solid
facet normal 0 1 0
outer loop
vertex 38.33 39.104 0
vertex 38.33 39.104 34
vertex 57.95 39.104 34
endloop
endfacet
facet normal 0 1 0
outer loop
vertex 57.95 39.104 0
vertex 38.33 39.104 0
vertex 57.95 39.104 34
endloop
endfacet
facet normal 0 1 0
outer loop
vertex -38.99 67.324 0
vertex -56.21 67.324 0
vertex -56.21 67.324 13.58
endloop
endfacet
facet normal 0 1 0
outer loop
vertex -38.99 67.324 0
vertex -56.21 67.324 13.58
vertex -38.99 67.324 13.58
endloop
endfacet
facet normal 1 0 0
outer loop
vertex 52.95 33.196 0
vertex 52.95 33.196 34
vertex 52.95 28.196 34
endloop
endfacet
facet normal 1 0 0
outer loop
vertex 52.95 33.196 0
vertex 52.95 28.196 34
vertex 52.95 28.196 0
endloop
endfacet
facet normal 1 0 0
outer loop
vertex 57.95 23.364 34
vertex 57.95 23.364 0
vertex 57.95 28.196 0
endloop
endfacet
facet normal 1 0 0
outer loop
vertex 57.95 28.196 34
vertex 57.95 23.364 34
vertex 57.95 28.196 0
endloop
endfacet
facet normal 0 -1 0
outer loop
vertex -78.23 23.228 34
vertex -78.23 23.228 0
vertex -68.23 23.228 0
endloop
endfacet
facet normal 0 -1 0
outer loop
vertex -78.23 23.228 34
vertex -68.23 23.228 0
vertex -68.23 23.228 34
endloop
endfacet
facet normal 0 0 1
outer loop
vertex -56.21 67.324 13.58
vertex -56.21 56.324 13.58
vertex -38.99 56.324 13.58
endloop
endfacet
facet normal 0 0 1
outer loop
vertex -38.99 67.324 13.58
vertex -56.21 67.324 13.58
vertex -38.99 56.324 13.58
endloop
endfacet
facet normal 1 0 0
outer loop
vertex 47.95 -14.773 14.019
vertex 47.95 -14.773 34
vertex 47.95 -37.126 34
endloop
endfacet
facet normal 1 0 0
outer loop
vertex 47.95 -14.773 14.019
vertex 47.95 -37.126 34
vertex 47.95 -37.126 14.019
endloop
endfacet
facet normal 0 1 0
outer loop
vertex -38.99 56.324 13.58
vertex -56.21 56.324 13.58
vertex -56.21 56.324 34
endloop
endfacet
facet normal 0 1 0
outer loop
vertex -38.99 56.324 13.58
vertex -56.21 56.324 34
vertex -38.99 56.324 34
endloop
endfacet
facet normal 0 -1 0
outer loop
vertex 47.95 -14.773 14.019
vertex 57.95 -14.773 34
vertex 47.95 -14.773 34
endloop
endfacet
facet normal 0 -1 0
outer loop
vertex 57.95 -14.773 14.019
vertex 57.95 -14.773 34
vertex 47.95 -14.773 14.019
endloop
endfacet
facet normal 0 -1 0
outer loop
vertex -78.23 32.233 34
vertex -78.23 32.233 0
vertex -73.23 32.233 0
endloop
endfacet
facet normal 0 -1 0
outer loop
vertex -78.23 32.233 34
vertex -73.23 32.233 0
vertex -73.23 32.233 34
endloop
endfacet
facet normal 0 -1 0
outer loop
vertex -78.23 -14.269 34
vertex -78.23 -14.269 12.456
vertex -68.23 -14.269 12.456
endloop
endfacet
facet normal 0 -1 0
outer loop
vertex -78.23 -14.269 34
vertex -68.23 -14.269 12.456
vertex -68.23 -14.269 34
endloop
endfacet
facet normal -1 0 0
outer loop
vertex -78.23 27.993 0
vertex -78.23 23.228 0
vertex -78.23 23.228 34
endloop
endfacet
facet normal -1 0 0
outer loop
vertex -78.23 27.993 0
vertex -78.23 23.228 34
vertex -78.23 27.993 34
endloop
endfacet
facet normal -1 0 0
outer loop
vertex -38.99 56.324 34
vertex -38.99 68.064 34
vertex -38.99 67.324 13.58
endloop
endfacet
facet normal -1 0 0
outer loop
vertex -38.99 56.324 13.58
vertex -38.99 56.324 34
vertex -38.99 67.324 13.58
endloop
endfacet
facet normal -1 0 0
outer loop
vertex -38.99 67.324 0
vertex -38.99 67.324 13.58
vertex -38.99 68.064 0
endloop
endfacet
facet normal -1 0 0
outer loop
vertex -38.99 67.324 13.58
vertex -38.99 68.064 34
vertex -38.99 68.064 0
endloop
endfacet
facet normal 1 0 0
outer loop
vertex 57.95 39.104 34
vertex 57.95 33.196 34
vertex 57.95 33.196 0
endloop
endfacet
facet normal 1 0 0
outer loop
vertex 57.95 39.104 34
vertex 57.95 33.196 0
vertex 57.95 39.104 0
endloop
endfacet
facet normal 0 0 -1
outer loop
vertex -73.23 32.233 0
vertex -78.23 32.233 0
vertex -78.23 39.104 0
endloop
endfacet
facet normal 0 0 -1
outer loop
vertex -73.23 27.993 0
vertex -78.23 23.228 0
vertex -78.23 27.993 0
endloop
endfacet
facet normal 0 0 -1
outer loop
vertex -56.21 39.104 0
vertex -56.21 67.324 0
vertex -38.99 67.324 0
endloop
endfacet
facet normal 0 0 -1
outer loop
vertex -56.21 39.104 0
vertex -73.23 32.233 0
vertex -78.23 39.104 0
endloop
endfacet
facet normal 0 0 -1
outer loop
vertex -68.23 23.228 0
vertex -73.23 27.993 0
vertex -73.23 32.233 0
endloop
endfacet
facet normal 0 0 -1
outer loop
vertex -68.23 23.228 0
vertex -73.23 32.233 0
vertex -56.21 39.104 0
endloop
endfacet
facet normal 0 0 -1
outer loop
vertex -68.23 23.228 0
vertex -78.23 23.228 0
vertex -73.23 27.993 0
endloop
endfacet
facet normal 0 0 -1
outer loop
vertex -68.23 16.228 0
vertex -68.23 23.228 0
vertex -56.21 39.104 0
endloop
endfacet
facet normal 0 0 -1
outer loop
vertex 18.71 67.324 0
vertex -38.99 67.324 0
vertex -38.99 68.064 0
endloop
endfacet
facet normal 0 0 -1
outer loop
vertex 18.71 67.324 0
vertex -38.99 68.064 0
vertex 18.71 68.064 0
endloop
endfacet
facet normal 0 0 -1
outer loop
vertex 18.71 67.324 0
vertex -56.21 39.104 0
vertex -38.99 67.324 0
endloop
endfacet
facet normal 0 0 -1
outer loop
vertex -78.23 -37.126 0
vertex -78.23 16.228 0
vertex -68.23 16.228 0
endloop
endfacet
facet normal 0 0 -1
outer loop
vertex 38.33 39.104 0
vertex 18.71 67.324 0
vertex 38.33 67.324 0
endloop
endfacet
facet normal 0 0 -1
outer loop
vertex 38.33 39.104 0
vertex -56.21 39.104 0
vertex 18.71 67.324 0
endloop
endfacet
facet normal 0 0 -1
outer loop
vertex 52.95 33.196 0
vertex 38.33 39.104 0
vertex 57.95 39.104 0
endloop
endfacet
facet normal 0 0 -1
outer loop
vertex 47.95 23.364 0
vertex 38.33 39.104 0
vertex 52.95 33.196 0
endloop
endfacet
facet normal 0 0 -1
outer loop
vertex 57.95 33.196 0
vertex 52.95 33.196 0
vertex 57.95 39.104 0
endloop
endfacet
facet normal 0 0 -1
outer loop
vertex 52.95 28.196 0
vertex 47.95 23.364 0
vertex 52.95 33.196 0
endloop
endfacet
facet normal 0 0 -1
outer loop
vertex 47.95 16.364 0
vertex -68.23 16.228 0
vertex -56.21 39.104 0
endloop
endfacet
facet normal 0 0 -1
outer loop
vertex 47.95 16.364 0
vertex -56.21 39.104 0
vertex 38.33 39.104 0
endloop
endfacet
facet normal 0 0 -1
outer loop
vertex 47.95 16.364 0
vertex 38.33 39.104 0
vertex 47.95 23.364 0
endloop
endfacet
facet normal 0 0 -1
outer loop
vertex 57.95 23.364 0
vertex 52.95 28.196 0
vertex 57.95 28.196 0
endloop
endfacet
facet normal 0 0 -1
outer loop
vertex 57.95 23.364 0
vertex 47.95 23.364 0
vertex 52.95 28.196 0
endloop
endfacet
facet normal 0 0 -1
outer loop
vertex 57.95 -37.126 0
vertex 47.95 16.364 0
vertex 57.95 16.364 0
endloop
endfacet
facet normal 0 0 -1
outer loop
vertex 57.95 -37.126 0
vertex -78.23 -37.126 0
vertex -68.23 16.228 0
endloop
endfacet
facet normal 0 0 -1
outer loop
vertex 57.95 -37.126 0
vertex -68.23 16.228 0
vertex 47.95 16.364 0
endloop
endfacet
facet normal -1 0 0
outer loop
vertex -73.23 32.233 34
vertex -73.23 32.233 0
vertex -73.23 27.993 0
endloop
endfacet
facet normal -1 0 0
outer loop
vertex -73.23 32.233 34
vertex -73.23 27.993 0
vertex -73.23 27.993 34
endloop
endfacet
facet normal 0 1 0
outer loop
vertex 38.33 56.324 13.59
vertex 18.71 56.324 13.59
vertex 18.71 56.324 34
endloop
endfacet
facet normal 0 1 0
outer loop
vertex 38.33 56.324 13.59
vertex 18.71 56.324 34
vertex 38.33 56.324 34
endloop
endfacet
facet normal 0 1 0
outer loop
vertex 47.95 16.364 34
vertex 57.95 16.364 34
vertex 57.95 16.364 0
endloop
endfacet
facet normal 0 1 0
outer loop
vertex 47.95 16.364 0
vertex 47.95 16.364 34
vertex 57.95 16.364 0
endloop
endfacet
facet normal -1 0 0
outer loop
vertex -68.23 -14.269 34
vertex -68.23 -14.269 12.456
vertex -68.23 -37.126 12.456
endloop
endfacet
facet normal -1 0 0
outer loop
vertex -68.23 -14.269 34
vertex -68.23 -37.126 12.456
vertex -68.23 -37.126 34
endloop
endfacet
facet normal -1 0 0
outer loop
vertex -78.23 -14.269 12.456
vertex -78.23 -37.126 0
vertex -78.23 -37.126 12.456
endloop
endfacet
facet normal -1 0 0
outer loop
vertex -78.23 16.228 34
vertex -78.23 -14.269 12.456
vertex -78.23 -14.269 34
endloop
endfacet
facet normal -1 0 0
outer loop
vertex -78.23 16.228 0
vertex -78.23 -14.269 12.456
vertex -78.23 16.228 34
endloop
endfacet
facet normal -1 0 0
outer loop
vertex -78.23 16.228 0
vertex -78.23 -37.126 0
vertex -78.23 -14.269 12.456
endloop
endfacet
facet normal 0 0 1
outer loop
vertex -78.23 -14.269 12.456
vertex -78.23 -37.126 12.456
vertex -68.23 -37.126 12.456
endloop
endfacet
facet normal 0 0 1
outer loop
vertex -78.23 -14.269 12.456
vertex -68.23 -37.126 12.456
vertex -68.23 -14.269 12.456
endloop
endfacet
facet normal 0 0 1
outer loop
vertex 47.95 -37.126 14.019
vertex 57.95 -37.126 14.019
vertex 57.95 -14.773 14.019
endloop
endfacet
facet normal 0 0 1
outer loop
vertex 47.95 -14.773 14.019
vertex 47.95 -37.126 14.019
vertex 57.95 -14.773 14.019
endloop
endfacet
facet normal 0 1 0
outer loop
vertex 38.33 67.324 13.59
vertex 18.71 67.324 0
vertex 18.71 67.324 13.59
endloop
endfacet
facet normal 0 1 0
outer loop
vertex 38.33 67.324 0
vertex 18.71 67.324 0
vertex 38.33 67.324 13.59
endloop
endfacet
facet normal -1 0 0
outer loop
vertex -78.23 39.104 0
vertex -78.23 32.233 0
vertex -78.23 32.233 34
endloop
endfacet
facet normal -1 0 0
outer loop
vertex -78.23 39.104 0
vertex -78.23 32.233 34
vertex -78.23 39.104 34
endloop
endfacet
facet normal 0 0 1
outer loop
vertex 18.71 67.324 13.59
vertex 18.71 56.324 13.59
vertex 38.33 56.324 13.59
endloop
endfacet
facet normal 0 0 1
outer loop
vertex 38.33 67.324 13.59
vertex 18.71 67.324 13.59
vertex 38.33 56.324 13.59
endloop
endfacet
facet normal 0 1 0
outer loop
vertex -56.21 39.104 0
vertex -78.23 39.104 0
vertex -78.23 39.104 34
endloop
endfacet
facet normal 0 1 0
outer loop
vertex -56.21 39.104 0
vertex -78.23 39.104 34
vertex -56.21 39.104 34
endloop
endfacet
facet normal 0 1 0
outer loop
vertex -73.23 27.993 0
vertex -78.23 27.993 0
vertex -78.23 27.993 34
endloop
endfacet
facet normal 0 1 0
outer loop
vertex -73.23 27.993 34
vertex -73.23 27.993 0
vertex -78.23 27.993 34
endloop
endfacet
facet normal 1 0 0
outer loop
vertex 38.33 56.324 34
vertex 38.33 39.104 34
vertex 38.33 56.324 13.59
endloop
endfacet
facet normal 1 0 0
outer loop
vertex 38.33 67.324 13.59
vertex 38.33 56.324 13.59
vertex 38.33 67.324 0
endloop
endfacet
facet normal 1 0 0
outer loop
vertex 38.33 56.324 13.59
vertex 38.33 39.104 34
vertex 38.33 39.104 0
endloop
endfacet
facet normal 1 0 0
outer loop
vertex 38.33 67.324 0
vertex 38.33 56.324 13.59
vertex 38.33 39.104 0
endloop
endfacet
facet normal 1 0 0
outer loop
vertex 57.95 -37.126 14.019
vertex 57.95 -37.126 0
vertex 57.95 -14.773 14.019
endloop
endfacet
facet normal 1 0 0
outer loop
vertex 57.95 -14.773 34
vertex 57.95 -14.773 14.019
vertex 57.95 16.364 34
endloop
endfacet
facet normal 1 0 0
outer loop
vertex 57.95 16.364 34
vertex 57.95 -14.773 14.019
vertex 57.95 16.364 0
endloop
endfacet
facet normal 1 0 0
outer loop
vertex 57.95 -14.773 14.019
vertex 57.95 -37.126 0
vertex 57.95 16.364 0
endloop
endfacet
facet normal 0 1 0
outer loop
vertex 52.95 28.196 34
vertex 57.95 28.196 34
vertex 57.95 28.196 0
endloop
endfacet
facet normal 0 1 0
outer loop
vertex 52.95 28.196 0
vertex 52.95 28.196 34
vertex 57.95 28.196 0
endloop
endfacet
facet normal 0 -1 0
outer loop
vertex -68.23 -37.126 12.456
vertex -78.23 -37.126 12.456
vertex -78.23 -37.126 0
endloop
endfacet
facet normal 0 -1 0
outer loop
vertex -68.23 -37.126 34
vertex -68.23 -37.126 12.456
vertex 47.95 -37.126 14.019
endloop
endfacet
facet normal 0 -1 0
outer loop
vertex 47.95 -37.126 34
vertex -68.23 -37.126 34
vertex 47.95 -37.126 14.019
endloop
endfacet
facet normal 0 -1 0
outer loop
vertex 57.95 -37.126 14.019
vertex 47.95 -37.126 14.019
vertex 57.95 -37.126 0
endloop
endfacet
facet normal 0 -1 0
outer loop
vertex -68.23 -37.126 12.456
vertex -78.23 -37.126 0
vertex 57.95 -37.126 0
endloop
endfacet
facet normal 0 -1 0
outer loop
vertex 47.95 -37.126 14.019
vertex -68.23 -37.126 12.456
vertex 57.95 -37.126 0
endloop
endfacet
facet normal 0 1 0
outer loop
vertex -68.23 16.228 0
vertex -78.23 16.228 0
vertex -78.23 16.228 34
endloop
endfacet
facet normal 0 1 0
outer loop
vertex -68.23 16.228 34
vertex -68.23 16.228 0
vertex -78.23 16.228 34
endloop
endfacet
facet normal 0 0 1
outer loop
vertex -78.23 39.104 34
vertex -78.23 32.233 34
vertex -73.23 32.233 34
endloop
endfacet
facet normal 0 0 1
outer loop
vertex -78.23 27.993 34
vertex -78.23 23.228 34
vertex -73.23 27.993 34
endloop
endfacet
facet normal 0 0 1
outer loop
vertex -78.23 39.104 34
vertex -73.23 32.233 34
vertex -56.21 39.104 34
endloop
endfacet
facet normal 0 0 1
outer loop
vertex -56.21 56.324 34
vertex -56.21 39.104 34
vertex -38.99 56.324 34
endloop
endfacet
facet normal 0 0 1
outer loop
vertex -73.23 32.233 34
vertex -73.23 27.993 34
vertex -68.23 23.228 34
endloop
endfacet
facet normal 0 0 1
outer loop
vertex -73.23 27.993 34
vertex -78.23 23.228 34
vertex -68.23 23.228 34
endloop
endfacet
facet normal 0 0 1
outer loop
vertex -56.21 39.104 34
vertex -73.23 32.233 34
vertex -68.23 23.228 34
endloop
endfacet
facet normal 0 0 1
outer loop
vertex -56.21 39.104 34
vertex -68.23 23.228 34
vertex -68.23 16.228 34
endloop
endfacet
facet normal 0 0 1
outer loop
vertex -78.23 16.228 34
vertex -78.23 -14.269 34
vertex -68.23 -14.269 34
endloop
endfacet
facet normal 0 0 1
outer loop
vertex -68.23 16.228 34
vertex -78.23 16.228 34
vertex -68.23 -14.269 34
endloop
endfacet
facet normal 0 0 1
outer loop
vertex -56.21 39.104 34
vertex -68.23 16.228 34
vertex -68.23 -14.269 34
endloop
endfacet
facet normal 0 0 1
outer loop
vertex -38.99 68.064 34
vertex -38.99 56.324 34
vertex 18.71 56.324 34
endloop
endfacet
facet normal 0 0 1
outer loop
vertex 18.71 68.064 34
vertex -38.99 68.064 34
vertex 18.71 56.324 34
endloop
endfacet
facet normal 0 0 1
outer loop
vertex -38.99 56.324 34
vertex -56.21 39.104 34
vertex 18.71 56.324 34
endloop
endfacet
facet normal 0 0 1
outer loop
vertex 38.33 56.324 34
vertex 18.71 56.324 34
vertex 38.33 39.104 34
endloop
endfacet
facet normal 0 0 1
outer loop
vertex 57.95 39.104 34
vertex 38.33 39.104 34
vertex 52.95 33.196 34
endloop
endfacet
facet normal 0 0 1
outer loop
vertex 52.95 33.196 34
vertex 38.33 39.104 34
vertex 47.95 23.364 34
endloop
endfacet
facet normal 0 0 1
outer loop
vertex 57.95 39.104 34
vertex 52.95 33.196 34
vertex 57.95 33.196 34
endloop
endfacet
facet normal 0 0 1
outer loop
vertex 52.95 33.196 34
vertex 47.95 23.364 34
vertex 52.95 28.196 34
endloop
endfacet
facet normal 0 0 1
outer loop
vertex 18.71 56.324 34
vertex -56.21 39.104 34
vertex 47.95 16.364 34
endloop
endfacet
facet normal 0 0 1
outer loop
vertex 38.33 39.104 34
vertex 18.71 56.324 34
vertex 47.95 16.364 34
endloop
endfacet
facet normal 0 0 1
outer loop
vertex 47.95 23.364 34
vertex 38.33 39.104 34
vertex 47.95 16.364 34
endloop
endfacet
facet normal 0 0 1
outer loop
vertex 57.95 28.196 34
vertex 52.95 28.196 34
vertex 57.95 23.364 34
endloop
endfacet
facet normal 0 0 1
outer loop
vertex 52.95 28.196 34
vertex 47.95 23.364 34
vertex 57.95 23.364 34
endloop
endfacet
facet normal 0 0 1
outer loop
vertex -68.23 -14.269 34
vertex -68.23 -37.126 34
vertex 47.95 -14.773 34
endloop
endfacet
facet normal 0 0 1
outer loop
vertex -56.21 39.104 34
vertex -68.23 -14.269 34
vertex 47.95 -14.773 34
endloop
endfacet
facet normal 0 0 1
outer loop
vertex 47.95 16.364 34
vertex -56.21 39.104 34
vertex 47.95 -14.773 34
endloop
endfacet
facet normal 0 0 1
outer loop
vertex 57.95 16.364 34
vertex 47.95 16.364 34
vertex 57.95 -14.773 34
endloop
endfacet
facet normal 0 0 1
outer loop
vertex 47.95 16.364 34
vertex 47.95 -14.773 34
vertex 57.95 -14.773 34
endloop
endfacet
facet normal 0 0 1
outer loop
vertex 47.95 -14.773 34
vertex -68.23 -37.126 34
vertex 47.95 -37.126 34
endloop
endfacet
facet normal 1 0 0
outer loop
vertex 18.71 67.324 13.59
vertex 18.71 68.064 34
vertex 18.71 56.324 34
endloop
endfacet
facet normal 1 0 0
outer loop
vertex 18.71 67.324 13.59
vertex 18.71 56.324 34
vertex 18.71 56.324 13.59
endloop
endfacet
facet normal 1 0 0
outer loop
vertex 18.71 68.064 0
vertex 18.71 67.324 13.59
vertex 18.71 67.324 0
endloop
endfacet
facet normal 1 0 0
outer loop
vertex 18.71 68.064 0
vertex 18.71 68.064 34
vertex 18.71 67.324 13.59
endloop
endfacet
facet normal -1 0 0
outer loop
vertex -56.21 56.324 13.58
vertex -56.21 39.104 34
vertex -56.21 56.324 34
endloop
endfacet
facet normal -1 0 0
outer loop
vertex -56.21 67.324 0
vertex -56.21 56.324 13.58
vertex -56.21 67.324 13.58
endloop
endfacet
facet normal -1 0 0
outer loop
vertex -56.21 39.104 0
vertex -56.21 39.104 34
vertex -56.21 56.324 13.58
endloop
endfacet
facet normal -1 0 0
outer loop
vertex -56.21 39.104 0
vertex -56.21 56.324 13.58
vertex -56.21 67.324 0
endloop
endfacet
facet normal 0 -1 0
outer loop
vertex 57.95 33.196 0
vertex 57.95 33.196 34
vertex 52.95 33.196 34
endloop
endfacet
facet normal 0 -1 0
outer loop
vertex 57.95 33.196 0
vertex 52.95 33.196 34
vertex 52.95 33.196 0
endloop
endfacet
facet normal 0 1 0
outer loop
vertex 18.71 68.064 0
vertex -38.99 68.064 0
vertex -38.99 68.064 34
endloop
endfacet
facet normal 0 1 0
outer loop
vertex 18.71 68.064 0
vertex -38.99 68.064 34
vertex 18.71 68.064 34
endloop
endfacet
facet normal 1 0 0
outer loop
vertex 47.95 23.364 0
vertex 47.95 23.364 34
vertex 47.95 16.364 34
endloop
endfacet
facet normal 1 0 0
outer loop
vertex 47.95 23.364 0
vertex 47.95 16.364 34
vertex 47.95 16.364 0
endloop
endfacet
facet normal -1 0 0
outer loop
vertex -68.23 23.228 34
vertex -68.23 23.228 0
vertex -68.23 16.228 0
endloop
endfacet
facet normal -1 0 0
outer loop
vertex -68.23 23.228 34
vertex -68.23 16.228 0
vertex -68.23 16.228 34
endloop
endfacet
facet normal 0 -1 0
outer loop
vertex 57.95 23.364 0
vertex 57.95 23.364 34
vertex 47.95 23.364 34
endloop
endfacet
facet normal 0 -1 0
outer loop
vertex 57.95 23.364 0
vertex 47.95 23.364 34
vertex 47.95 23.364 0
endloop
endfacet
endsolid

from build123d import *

# Parameters (mm, degrees)
SKETCH_1_W           = 136.18
SKETCH_1_H           = 105.19
EXTRUDE_1_DEPTH      = 34
SKETCH_3_W           = 39.24
SKETCH_3_H           = 34
CUT_EXTRUDE_1_DEPTH  = 28.96
SKETCH_4_W           = 17.22
SKETCH_4_H           = 34
EXTRUDE_2_DEPTH      = 17.22
SKETCH_5_W           = 19.62
SKETCH_5_H           = 34
EXTRUDE_3_DEPTH      = 17.22
SKETCH_6_W           = 34
SKETCH_6_H           = 4.24
CUT_EXTRUDE_2_DEPTH  = 5
SKETCH_7_W           = 34
SKETCH_7_H           = 7
CUT_EXTRUDE_4_DEPTH  = 10
SKETCH_9_W           = 19.62
SKETCH_9_H           = 13.59
EXTRUDE_4_DEPTH      = 11
SKETCH_10_W          = 17.22
SKETCH_10_H          = 13.58
EXTRUDE_5_DEPTH      = 11
SKETCH_11_W          = 34
SKETCH_11_H          = 5
CUT_EXTRUDE_7_DEPTH  = 5
SKETCH_13_W          = 33.75
SKETCH_13_H          = 7
CUT_EXTRUDE_9_DEPTH  = 10
SKETCH_15_W          = 10
SKETCH_15_H          = 7
CUT_EXTRUDE_10_DEPTH = 10
SKETCH_16_W          = 21.544160933
SKETCH_16_H          = 22.857254915
CUT_EXTRUDE_11_DEPTH = 10
SKETCH_18_W          = 19.981240116
SKETCH_18_H          = 22.352912948
CUT_EXTRUDE_12_DEPTH = 10


with BuildPart() as part:
    # 草图1 → 凸台-拉伸1 (new body)
    with BuildSketch(Plane.XY):
        with Locations((-10.139734918, 15.469024107)):
            Rectangle(SKETCH_1_W, SKETCH_1_H)
    extrude(amount=EXTRUDE_1_DEPTH)

    # 草图3 → 切除-拉伸1 (cut)
    with BuildSketch(Plane(origin=(0, 68.064024107, 0), x_dir=(1, 0, 0), z_dir=(0, 1, 0))):
        with Locations((-58.609734918, -17)):
            Rectangle(SKETCH_3_W, SKETCH_3_H)
        with Locations((38.330265082, -17)):
            Rectangle(SKETCH_3_W, SKETCH_3_H)
    extrude(amount=-CUT_EXTRUDE_1_DEPTH, mode=Mode.SUBTRACT)

    # 草图4 → 凸台-拉伸2 (add)
    with BuildSketch(Plane(origin=(0, 39.104024107, 0), x_dir=(1, 0, 0), z_dir=(0, 1, 0))):
        with Locations((-47.599734918, -17)):
            Rectangle(SKETCH_4_W, SKETCH_4_H)
    extrude(amount=EXTRUDE_2_DEPTH)

    # 草图5 → 凸台-拉伸3 (add)
    with BuildSketch(Plane(origin=(0, 39.104024107, 0), x_dir=(1, 0, 0), z_dir=(0, 1, 0))):
        with Locations((28.520265082, -17)):
            Rectangle(SKETCH_5_W, SKETCH_5_H)
    extrude(amount=EXTRUDE_3_DEPTH)

    # 草图6 → 切除-拉伸2 (cut)
    with BuildSketch(Plane.ZY.offset(78.229734918)):
        with Locations((17, 30.112750363)):
            Rectangle(SKETCH_6_W, SKETCH_6_H)
    extrude(amount=-CUT_EXTRUDE_2_DEPTH, mode=Mode.SUBTRACT)

    # 草图7 → 切除-拉伸4 (cut)
    with BuildSketch(Plane.ZY.offset(78.229734918)):
        with Locations((17, 19.728275547)):
            Rectangle(SKETCH_7_W, SKETCH_7_H)
    extrude(amount=-CUT_EXTRUDE_4_DEPTH, mode=Mode.SUBTRACT)

    # 草图9 → 凸台-拉伸4 (add)
    with BuildSketch(Plane(origin=(0, 56.324024107, 0), x_dir=(1, 0, 0), z_dir=(0, 1, 0))):
        with Locations((28.520265082, -6.795)):
            Rectangle(SKETCH_9_W, SKETCH_9_H)
    extrude(amount=EXTRUDE_4_DEPTH)

    # 草图10 → 凸台-拉伸5 (add)
    with BuildSketch(Plane(origin=(0, 56.324024107, 0), x_dir=(1, 0, 0), z_dir=(0, 1, 0))):
        with Locations((-47.599734918, -6.79)):
            Rectangle(SKETCH_10_W, SKETCH_10_H)
    extrude(amount=EXTRUDE_5_DEPTH)

    # 草图11 → 切除-拉伸7 (cut)
    with BuildSketch(Plane(origin=(57.950265082, 0, 0), x_dir=(0, 0, -1), z_dir=(1, 0, 0))):
        with Locations((-17, 30.695910163)):
            Rectangle(SKETCH_11_W, SKETCH_11_H)
    extrude(amount=-CUT_EXTRUDE_7_DEPTH, mode=Mode.SUBTRACT)

    # 草图13 → 切除-拉伸9 (cut)
    with BuildSketch(Plane(origin=(57.950265082, 0, 0), x_dir=(0, 0, -1), z_dir=(1, 0, 0))):
        with Locations((-16.874526915, 19.863616172)):
            Rectangle(SKETCH_13_W, SKETCH_13_H)
    extrude(amount=-CUT_EXTRUDE_9_DEPTH, mode=Mode.SUBTRACT)

    # 草图15 → 切除-拉伸10 (cut)
    with BuildSketch(Plane(origin=(0, 0, 33.749526915), x_dir=(-1, 0, 0), z_dir=(0, 0, -1))):
        with Locations((-52.950265082, 19.863616172)):
            Rectangle(SKETCH_15_W, SKETCH_15_H)
    extrude(amount=-CUT_EXTRUDE_10_DEPTH, mode=Mode.SUBTRACT)

    # 草图16 → 切除-拉伸11 (cut)
    with BuildSketch(Plane.ZY.offset(78.229734918)):
        with Locations((23.227919533, -25.697348436)):
            Rectangle(SKETCH_16_W, SKETCH_16_H)
    extrude(amount=-CUT_EXTRUDE_11_DEPTH, mode=Mode.SUBTRACT)

    # 草图18 → 切除-拉伸12 (cut)
    with BuildSketch(Plane(origin=(57.950265082, 0, 0), x_dir=(0, 0, -1), z_dir=(1, 0, 0))):
        with Locations((-24.009379942, -25.949519419)):
            Rectangle(SKETCH_18_W, SKETCH_18_H)
    extrude(amount=-CUT_EXTRUDE_12_DEPTH, mode=Mode.SUBTRACT)


solid = part.part
